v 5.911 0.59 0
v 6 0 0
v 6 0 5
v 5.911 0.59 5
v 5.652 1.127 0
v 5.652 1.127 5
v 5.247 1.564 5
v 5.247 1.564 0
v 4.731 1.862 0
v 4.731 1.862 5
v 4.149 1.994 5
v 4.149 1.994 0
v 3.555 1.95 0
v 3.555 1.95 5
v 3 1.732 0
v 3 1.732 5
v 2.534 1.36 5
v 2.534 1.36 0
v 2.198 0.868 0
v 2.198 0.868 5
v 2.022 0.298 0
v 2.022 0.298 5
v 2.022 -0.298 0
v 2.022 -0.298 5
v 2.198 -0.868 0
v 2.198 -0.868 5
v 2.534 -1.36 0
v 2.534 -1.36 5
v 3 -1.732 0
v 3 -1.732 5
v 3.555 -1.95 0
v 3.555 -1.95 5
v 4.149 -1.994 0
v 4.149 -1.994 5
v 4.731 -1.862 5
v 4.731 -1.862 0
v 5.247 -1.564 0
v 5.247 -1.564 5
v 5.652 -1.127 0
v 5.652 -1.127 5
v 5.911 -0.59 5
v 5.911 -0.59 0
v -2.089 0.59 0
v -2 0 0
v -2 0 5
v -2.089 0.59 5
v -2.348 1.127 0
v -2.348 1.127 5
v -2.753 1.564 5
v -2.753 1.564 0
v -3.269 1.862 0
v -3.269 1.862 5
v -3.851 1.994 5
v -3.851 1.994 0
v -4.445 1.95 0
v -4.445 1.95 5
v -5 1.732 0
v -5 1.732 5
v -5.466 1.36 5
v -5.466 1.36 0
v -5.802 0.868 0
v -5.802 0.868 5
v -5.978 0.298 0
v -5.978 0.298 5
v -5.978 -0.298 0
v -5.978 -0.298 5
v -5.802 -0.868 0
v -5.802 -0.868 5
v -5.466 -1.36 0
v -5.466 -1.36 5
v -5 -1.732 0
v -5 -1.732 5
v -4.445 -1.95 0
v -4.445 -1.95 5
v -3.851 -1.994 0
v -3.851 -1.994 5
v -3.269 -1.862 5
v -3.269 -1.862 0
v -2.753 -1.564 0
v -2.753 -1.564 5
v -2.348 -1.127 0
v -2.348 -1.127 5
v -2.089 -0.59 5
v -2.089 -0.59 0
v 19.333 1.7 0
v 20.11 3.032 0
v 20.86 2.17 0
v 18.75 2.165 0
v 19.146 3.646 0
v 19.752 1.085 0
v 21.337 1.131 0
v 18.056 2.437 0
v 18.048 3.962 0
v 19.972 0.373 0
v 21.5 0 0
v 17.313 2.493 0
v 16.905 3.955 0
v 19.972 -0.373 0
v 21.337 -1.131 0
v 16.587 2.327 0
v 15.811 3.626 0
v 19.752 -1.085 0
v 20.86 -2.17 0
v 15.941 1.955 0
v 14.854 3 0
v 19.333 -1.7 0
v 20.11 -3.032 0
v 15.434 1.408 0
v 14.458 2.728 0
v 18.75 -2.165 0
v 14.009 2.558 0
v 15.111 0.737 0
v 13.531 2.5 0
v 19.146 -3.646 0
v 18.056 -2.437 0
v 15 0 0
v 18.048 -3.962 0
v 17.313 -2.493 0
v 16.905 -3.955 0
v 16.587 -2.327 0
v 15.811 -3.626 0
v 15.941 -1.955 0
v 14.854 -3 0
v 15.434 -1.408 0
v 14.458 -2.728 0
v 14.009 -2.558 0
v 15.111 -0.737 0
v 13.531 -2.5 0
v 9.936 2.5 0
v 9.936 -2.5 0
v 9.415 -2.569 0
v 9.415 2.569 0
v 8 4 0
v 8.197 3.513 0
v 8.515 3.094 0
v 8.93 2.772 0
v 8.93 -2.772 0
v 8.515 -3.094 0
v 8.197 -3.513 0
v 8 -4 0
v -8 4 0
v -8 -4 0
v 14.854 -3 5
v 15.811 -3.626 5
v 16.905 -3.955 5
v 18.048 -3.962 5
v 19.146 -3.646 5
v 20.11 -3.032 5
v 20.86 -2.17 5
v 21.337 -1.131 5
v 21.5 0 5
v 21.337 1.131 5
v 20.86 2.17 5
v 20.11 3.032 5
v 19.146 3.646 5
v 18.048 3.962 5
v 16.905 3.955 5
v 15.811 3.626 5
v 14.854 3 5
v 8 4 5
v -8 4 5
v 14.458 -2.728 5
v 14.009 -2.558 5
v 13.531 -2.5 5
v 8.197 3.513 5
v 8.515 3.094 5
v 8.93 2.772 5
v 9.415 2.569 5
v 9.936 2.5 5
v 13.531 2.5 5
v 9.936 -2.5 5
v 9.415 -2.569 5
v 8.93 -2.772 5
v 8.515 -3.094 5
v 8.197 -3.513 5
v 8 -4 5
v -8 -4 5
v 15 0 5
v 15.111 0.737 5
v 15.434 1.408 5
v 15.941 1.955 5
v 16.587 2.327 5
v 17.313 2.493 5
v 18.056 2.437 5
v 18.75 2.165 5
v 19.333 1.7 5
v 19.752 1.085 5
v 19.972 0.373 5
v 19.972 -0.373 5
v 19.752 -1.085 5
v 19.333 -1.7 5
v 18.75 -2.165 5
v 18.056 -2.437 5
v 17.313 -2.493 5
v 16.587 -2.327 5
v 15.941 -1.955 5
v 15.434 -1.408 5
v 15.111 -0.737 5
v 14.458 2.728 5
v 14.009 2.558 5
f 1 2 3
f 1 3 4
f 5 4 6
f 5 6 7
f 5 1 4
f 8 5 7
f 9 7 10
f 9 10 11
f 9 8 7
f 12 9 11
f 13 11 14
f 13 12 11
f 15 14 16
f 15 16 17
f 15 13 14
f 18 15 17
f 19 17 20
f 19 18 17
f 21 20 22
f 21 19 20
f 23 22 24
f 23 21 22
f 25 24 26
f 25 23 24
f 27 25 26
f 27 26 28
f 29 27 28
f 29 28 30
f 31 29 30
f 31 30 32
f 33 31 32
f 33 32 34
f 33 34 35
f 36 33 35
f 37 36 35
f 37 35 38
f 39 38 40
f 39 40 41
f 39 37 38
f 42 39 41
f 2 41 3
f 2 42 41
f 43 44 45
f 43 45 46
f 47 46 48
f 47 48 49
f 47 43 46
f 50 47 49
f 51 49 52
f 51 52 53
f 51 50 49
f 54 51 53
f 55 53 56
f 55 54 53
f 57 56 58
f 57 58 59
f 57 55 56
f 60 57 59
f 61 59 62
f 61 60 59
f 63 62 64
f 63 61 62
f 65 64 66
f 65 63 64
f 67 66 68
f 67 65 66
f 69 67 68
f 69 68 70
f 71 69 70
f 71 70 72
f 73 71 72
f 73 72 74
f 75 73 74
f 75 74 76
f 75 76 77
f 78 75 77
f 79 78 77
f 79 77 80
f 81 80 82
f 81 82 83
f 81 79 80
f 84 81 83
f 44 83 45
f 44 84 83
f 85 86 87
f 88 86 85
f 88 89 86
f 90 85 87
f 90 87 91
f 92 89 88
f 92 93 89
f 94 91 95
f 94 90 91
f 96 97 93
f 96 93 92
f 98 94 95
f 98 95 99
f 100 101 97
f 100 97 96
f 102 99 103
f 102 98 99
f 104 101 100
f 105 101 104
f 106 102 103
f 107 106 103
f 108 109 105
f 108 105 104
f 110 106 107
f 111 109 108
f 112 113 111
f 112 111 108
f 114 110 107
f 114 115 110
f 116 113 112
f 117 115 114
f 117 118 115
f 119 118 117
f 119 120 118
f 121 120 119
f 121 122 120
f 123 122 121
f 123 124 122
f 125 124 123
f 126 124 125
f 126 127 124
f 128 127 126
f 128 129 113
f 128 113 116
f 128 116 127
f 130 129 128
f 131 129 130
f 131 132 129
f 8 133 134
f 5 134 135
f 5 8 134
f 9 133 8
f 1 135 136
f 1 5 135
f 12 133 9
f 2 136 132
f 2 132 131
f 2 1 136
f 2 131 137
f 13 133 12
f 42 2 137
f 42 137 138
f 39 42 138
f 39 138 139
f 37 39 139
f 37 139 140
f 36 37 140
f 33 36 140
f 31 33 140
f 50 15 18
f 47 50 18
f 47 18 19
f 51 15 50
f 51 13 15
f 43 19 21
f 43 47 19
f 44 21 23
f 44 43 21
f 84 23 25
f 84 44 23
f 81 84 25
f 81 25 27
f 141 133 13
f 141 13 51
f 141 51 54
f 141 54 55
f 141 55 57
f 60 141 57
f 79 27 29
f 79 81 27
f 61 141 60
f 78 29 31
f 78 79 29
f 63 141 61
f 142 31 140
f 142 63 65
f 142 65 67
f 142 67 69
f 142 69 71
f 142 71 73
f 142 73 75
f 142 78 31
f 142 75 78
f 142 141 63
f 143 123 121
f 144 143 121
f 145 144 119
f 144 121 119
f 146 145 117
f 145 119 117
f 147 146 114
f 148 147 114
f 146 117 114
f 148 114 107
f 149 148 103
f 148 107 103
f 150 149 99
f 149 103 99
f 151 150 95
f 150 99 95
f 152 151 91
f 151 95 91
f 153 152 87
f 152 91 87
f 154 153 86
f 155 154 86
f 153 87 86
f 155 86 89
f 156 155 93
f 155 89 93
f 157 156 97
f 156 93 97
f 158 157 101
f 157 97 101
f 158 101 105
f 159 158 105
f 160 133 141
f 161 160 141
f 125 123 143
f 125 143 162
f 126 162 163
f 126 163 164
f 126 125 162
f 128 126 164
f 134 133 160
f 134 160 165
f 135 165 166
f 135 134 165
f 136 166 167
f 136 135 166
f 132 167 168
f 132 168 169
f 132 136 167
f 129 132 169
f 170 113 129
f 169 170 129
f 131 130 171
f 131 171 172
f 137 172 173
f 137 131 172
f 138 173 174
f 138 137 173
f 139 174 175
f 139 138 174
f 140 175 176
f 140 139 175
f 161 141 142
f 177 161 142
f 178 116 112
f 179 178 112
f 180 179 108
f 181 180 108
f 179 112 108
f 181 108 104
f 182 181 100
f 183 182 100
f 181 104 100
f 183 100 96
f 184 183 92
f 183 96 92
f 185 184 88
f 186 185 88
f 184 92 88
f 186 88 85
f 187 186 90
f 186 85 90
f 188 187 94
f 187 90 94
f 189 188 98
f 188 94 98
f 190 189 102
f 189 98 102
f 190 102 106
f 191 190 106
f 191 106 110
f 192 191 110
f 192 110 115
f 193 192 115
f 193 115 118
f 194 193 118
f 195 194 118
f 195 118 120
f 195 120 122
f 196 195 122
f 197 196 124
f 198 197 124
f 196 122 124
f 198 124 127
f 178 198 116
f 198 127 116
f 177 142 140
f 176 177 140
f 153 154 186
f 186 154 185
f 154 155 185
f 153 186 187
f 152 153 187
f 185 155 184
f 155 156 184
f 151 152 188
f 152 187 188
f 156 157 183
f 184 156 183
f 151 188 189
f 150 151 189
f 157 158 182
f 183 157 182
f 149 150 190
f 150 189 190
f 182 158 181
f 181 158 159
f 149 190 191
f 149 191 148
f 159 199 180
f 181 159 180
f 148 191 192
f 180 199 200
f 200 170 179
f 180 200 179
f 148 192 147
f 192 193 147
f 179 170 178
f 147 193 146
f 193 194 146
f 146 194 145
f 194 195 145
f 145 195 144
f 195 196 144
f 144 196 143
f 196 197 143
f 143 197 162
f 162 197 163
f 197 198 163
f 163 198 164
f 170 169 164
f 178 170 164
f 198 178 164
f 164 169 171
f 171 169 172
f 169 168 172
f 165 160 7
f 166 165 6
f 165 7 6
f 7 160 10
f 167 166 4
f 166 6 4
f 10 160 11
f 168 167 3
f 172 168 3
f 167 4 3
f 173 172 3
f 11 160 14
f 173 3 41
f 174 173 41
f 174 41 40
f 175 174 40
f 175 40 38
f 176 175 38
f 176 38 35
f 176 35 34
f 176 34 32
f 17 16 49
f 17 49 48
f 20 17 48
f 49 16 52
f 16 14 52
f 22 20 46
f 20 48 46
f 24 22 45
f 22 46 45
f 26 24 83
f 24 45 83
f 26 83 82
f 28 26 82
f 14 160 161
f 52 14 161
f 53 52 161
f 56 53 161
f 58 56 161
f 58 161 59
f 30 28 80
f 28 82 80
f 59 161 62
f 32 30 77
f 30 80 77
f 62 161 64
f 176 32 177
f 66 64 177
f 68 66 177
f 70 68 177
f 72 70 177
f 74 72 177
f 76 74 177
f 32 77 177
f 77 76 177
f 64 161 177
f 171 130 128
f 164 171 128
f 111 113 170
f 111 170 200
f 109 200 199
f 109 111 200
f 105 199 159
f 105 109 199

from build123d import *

# Parameters (mm, degrees)
SKETCH1_R           = 2
BOSS_EXTRUDE1_DEPTH = 5
FILLET1_R           = 2


with BuildPart() as part:
    # Sketch1 → Boss-Extrude1 (new body)
    with BuildSketch(Plane.XY):
        with BuildLine():
            Line((8, 4), (-8, 4))
            Line((-8, 4), (-8, -4))
            Line((-8, -4), (8, -4))
            Line((8, -4), (8, -2.5))
            Line((8, -2.5), (14.377501001, -2.5))
            ThreePointArc((14.377501001, -2.5), (21.5, 0), (14.377501001, 2.5))
            Line((14.377501001, 2.5), (8, 2.5))
            Line((8, 2.5), (8, 4))
        make_face()
        with Locations((-4, 0)):
            Circle(SKETCH1_R, mode=Mode.SUBTRACT)
        with Locations((4, 0)):
            Circle(SKETCH1_R, mode=Mode.SUBTRACT)
        with BuildLine():
            ThreePointArc((20, 0), (17.5, -2.5), (15, 0))
            ThreePointArc((15, 0), (17.5, 2.5), (20, 0))
        make_face(mode=Mode.SUBTRACT)
    extrude(amount=BOSS_EXTRUDE1_DEPTH)

    # Fillet1
    # the kernel refuses this fillet: 2 mm, written as the material it adds along each edge
    with BuildSketch(Plane(origin=(14.377501001, -2.5, 0), x_dir=(0.6900779887780536, -0.7237350132500407, 0), z_dir=(0, 0, 1))) as fillet1_piece_1:
        with BuildLine():
            CenterArc((0.863575741, -1.992528413), FILLET1_R, 94.954095219, 41.409622109)
            Line((-0.583894286, -0.612372436), (-0.612843687, -0.584769316))
            Line((-0.612843687, -0.584769316), (-0.028949401, 0.02760312))
            Line((-0.028949401, 0.02760312), (0.003454303, 0.039850568))
            ThreePointArc((0.003454303, 0.039850568), (0.345430296, 0.025056827), (0.687406289, 0.039850568))
            Line((0.687406289, 0.039850568), (0.690860592, 0))
        make_face()
    extrude(amount=5)
    with BuildSketch(Plane(origin=(8, -2.5, 0), x_dir=(1, 0, 0), z_dir=(0, 0, 1))) as fillet1_piece_2:
        with BuildLine():
            CenterArc((1.936491673, -2), FILLET1_R, 90, 75.522487814)
            Line((0, -1.5), (-0.038729833, -1.49))
            ThreePointArc((-0.038729833, -1.49), (-0.04, -0.75), (-0.04, 0))
            Line((-0.04, 0), (0, 0.04))
            Line((0, 0.04), (1.936491673, 0.04))
            Line((1.936491673, 0.04), (1.936491673, 0))
        make_face()
    extrude(amount=5)
    with BuildSketch(Plane(origin=(14.377501001, 2.5, 0), x_dir=(0.6900779887780526, 0.7237350132500416, 0), z_dir=(0, 0, 1))) as fillet1_piece_3:
        with BuildLine():
            CenterArc((0.863575741, 1.992528413), FILLET1_R, 223.636282672, 41.409622109)
            Line((-0.583894286, 0.612372436), (-0.612843687, 0.584769316))
            Line((-0.612843687, 0.584769316), (-0.028949401, -0.02760312))
            Line((-0.028949401, -0.02760312), (0.003454303, -0.039850568))
            ThreePointArc((0.003454303, -0.039850568), (0.345430296, -0.025056827), (0.687406289, -0.039850568))
            Line((0.687406289, -0.039850568), (0.690860592, 0))
        make_face()
    extrude(amount=5)
    with BuildSketch(Plane(origin=(8, 2.5, 0), x_dir=(0, 1, 0), z_dir=(0, 0, 1))) as fillet1_piece_4:
        with BuildLine():
            CenterArc((2, -1.936491673), FILLET1_R, 104.477512186, 75.522487814)
            Line((0, -1.936491673), (-0.04, -1.936491673))
            Line((-0.04, -1.936491673), (-0.04, 0))
            Line((-0.04, 0), (0, 0.04))
            ThreePointArc((0, 0.04), (0.75, 0.04), (1.49, 0.038729833))
            Line((1.49, 0.038729833), (1.5, 0))
        make_face()
    extrude(amount=5)


solid = part.part
